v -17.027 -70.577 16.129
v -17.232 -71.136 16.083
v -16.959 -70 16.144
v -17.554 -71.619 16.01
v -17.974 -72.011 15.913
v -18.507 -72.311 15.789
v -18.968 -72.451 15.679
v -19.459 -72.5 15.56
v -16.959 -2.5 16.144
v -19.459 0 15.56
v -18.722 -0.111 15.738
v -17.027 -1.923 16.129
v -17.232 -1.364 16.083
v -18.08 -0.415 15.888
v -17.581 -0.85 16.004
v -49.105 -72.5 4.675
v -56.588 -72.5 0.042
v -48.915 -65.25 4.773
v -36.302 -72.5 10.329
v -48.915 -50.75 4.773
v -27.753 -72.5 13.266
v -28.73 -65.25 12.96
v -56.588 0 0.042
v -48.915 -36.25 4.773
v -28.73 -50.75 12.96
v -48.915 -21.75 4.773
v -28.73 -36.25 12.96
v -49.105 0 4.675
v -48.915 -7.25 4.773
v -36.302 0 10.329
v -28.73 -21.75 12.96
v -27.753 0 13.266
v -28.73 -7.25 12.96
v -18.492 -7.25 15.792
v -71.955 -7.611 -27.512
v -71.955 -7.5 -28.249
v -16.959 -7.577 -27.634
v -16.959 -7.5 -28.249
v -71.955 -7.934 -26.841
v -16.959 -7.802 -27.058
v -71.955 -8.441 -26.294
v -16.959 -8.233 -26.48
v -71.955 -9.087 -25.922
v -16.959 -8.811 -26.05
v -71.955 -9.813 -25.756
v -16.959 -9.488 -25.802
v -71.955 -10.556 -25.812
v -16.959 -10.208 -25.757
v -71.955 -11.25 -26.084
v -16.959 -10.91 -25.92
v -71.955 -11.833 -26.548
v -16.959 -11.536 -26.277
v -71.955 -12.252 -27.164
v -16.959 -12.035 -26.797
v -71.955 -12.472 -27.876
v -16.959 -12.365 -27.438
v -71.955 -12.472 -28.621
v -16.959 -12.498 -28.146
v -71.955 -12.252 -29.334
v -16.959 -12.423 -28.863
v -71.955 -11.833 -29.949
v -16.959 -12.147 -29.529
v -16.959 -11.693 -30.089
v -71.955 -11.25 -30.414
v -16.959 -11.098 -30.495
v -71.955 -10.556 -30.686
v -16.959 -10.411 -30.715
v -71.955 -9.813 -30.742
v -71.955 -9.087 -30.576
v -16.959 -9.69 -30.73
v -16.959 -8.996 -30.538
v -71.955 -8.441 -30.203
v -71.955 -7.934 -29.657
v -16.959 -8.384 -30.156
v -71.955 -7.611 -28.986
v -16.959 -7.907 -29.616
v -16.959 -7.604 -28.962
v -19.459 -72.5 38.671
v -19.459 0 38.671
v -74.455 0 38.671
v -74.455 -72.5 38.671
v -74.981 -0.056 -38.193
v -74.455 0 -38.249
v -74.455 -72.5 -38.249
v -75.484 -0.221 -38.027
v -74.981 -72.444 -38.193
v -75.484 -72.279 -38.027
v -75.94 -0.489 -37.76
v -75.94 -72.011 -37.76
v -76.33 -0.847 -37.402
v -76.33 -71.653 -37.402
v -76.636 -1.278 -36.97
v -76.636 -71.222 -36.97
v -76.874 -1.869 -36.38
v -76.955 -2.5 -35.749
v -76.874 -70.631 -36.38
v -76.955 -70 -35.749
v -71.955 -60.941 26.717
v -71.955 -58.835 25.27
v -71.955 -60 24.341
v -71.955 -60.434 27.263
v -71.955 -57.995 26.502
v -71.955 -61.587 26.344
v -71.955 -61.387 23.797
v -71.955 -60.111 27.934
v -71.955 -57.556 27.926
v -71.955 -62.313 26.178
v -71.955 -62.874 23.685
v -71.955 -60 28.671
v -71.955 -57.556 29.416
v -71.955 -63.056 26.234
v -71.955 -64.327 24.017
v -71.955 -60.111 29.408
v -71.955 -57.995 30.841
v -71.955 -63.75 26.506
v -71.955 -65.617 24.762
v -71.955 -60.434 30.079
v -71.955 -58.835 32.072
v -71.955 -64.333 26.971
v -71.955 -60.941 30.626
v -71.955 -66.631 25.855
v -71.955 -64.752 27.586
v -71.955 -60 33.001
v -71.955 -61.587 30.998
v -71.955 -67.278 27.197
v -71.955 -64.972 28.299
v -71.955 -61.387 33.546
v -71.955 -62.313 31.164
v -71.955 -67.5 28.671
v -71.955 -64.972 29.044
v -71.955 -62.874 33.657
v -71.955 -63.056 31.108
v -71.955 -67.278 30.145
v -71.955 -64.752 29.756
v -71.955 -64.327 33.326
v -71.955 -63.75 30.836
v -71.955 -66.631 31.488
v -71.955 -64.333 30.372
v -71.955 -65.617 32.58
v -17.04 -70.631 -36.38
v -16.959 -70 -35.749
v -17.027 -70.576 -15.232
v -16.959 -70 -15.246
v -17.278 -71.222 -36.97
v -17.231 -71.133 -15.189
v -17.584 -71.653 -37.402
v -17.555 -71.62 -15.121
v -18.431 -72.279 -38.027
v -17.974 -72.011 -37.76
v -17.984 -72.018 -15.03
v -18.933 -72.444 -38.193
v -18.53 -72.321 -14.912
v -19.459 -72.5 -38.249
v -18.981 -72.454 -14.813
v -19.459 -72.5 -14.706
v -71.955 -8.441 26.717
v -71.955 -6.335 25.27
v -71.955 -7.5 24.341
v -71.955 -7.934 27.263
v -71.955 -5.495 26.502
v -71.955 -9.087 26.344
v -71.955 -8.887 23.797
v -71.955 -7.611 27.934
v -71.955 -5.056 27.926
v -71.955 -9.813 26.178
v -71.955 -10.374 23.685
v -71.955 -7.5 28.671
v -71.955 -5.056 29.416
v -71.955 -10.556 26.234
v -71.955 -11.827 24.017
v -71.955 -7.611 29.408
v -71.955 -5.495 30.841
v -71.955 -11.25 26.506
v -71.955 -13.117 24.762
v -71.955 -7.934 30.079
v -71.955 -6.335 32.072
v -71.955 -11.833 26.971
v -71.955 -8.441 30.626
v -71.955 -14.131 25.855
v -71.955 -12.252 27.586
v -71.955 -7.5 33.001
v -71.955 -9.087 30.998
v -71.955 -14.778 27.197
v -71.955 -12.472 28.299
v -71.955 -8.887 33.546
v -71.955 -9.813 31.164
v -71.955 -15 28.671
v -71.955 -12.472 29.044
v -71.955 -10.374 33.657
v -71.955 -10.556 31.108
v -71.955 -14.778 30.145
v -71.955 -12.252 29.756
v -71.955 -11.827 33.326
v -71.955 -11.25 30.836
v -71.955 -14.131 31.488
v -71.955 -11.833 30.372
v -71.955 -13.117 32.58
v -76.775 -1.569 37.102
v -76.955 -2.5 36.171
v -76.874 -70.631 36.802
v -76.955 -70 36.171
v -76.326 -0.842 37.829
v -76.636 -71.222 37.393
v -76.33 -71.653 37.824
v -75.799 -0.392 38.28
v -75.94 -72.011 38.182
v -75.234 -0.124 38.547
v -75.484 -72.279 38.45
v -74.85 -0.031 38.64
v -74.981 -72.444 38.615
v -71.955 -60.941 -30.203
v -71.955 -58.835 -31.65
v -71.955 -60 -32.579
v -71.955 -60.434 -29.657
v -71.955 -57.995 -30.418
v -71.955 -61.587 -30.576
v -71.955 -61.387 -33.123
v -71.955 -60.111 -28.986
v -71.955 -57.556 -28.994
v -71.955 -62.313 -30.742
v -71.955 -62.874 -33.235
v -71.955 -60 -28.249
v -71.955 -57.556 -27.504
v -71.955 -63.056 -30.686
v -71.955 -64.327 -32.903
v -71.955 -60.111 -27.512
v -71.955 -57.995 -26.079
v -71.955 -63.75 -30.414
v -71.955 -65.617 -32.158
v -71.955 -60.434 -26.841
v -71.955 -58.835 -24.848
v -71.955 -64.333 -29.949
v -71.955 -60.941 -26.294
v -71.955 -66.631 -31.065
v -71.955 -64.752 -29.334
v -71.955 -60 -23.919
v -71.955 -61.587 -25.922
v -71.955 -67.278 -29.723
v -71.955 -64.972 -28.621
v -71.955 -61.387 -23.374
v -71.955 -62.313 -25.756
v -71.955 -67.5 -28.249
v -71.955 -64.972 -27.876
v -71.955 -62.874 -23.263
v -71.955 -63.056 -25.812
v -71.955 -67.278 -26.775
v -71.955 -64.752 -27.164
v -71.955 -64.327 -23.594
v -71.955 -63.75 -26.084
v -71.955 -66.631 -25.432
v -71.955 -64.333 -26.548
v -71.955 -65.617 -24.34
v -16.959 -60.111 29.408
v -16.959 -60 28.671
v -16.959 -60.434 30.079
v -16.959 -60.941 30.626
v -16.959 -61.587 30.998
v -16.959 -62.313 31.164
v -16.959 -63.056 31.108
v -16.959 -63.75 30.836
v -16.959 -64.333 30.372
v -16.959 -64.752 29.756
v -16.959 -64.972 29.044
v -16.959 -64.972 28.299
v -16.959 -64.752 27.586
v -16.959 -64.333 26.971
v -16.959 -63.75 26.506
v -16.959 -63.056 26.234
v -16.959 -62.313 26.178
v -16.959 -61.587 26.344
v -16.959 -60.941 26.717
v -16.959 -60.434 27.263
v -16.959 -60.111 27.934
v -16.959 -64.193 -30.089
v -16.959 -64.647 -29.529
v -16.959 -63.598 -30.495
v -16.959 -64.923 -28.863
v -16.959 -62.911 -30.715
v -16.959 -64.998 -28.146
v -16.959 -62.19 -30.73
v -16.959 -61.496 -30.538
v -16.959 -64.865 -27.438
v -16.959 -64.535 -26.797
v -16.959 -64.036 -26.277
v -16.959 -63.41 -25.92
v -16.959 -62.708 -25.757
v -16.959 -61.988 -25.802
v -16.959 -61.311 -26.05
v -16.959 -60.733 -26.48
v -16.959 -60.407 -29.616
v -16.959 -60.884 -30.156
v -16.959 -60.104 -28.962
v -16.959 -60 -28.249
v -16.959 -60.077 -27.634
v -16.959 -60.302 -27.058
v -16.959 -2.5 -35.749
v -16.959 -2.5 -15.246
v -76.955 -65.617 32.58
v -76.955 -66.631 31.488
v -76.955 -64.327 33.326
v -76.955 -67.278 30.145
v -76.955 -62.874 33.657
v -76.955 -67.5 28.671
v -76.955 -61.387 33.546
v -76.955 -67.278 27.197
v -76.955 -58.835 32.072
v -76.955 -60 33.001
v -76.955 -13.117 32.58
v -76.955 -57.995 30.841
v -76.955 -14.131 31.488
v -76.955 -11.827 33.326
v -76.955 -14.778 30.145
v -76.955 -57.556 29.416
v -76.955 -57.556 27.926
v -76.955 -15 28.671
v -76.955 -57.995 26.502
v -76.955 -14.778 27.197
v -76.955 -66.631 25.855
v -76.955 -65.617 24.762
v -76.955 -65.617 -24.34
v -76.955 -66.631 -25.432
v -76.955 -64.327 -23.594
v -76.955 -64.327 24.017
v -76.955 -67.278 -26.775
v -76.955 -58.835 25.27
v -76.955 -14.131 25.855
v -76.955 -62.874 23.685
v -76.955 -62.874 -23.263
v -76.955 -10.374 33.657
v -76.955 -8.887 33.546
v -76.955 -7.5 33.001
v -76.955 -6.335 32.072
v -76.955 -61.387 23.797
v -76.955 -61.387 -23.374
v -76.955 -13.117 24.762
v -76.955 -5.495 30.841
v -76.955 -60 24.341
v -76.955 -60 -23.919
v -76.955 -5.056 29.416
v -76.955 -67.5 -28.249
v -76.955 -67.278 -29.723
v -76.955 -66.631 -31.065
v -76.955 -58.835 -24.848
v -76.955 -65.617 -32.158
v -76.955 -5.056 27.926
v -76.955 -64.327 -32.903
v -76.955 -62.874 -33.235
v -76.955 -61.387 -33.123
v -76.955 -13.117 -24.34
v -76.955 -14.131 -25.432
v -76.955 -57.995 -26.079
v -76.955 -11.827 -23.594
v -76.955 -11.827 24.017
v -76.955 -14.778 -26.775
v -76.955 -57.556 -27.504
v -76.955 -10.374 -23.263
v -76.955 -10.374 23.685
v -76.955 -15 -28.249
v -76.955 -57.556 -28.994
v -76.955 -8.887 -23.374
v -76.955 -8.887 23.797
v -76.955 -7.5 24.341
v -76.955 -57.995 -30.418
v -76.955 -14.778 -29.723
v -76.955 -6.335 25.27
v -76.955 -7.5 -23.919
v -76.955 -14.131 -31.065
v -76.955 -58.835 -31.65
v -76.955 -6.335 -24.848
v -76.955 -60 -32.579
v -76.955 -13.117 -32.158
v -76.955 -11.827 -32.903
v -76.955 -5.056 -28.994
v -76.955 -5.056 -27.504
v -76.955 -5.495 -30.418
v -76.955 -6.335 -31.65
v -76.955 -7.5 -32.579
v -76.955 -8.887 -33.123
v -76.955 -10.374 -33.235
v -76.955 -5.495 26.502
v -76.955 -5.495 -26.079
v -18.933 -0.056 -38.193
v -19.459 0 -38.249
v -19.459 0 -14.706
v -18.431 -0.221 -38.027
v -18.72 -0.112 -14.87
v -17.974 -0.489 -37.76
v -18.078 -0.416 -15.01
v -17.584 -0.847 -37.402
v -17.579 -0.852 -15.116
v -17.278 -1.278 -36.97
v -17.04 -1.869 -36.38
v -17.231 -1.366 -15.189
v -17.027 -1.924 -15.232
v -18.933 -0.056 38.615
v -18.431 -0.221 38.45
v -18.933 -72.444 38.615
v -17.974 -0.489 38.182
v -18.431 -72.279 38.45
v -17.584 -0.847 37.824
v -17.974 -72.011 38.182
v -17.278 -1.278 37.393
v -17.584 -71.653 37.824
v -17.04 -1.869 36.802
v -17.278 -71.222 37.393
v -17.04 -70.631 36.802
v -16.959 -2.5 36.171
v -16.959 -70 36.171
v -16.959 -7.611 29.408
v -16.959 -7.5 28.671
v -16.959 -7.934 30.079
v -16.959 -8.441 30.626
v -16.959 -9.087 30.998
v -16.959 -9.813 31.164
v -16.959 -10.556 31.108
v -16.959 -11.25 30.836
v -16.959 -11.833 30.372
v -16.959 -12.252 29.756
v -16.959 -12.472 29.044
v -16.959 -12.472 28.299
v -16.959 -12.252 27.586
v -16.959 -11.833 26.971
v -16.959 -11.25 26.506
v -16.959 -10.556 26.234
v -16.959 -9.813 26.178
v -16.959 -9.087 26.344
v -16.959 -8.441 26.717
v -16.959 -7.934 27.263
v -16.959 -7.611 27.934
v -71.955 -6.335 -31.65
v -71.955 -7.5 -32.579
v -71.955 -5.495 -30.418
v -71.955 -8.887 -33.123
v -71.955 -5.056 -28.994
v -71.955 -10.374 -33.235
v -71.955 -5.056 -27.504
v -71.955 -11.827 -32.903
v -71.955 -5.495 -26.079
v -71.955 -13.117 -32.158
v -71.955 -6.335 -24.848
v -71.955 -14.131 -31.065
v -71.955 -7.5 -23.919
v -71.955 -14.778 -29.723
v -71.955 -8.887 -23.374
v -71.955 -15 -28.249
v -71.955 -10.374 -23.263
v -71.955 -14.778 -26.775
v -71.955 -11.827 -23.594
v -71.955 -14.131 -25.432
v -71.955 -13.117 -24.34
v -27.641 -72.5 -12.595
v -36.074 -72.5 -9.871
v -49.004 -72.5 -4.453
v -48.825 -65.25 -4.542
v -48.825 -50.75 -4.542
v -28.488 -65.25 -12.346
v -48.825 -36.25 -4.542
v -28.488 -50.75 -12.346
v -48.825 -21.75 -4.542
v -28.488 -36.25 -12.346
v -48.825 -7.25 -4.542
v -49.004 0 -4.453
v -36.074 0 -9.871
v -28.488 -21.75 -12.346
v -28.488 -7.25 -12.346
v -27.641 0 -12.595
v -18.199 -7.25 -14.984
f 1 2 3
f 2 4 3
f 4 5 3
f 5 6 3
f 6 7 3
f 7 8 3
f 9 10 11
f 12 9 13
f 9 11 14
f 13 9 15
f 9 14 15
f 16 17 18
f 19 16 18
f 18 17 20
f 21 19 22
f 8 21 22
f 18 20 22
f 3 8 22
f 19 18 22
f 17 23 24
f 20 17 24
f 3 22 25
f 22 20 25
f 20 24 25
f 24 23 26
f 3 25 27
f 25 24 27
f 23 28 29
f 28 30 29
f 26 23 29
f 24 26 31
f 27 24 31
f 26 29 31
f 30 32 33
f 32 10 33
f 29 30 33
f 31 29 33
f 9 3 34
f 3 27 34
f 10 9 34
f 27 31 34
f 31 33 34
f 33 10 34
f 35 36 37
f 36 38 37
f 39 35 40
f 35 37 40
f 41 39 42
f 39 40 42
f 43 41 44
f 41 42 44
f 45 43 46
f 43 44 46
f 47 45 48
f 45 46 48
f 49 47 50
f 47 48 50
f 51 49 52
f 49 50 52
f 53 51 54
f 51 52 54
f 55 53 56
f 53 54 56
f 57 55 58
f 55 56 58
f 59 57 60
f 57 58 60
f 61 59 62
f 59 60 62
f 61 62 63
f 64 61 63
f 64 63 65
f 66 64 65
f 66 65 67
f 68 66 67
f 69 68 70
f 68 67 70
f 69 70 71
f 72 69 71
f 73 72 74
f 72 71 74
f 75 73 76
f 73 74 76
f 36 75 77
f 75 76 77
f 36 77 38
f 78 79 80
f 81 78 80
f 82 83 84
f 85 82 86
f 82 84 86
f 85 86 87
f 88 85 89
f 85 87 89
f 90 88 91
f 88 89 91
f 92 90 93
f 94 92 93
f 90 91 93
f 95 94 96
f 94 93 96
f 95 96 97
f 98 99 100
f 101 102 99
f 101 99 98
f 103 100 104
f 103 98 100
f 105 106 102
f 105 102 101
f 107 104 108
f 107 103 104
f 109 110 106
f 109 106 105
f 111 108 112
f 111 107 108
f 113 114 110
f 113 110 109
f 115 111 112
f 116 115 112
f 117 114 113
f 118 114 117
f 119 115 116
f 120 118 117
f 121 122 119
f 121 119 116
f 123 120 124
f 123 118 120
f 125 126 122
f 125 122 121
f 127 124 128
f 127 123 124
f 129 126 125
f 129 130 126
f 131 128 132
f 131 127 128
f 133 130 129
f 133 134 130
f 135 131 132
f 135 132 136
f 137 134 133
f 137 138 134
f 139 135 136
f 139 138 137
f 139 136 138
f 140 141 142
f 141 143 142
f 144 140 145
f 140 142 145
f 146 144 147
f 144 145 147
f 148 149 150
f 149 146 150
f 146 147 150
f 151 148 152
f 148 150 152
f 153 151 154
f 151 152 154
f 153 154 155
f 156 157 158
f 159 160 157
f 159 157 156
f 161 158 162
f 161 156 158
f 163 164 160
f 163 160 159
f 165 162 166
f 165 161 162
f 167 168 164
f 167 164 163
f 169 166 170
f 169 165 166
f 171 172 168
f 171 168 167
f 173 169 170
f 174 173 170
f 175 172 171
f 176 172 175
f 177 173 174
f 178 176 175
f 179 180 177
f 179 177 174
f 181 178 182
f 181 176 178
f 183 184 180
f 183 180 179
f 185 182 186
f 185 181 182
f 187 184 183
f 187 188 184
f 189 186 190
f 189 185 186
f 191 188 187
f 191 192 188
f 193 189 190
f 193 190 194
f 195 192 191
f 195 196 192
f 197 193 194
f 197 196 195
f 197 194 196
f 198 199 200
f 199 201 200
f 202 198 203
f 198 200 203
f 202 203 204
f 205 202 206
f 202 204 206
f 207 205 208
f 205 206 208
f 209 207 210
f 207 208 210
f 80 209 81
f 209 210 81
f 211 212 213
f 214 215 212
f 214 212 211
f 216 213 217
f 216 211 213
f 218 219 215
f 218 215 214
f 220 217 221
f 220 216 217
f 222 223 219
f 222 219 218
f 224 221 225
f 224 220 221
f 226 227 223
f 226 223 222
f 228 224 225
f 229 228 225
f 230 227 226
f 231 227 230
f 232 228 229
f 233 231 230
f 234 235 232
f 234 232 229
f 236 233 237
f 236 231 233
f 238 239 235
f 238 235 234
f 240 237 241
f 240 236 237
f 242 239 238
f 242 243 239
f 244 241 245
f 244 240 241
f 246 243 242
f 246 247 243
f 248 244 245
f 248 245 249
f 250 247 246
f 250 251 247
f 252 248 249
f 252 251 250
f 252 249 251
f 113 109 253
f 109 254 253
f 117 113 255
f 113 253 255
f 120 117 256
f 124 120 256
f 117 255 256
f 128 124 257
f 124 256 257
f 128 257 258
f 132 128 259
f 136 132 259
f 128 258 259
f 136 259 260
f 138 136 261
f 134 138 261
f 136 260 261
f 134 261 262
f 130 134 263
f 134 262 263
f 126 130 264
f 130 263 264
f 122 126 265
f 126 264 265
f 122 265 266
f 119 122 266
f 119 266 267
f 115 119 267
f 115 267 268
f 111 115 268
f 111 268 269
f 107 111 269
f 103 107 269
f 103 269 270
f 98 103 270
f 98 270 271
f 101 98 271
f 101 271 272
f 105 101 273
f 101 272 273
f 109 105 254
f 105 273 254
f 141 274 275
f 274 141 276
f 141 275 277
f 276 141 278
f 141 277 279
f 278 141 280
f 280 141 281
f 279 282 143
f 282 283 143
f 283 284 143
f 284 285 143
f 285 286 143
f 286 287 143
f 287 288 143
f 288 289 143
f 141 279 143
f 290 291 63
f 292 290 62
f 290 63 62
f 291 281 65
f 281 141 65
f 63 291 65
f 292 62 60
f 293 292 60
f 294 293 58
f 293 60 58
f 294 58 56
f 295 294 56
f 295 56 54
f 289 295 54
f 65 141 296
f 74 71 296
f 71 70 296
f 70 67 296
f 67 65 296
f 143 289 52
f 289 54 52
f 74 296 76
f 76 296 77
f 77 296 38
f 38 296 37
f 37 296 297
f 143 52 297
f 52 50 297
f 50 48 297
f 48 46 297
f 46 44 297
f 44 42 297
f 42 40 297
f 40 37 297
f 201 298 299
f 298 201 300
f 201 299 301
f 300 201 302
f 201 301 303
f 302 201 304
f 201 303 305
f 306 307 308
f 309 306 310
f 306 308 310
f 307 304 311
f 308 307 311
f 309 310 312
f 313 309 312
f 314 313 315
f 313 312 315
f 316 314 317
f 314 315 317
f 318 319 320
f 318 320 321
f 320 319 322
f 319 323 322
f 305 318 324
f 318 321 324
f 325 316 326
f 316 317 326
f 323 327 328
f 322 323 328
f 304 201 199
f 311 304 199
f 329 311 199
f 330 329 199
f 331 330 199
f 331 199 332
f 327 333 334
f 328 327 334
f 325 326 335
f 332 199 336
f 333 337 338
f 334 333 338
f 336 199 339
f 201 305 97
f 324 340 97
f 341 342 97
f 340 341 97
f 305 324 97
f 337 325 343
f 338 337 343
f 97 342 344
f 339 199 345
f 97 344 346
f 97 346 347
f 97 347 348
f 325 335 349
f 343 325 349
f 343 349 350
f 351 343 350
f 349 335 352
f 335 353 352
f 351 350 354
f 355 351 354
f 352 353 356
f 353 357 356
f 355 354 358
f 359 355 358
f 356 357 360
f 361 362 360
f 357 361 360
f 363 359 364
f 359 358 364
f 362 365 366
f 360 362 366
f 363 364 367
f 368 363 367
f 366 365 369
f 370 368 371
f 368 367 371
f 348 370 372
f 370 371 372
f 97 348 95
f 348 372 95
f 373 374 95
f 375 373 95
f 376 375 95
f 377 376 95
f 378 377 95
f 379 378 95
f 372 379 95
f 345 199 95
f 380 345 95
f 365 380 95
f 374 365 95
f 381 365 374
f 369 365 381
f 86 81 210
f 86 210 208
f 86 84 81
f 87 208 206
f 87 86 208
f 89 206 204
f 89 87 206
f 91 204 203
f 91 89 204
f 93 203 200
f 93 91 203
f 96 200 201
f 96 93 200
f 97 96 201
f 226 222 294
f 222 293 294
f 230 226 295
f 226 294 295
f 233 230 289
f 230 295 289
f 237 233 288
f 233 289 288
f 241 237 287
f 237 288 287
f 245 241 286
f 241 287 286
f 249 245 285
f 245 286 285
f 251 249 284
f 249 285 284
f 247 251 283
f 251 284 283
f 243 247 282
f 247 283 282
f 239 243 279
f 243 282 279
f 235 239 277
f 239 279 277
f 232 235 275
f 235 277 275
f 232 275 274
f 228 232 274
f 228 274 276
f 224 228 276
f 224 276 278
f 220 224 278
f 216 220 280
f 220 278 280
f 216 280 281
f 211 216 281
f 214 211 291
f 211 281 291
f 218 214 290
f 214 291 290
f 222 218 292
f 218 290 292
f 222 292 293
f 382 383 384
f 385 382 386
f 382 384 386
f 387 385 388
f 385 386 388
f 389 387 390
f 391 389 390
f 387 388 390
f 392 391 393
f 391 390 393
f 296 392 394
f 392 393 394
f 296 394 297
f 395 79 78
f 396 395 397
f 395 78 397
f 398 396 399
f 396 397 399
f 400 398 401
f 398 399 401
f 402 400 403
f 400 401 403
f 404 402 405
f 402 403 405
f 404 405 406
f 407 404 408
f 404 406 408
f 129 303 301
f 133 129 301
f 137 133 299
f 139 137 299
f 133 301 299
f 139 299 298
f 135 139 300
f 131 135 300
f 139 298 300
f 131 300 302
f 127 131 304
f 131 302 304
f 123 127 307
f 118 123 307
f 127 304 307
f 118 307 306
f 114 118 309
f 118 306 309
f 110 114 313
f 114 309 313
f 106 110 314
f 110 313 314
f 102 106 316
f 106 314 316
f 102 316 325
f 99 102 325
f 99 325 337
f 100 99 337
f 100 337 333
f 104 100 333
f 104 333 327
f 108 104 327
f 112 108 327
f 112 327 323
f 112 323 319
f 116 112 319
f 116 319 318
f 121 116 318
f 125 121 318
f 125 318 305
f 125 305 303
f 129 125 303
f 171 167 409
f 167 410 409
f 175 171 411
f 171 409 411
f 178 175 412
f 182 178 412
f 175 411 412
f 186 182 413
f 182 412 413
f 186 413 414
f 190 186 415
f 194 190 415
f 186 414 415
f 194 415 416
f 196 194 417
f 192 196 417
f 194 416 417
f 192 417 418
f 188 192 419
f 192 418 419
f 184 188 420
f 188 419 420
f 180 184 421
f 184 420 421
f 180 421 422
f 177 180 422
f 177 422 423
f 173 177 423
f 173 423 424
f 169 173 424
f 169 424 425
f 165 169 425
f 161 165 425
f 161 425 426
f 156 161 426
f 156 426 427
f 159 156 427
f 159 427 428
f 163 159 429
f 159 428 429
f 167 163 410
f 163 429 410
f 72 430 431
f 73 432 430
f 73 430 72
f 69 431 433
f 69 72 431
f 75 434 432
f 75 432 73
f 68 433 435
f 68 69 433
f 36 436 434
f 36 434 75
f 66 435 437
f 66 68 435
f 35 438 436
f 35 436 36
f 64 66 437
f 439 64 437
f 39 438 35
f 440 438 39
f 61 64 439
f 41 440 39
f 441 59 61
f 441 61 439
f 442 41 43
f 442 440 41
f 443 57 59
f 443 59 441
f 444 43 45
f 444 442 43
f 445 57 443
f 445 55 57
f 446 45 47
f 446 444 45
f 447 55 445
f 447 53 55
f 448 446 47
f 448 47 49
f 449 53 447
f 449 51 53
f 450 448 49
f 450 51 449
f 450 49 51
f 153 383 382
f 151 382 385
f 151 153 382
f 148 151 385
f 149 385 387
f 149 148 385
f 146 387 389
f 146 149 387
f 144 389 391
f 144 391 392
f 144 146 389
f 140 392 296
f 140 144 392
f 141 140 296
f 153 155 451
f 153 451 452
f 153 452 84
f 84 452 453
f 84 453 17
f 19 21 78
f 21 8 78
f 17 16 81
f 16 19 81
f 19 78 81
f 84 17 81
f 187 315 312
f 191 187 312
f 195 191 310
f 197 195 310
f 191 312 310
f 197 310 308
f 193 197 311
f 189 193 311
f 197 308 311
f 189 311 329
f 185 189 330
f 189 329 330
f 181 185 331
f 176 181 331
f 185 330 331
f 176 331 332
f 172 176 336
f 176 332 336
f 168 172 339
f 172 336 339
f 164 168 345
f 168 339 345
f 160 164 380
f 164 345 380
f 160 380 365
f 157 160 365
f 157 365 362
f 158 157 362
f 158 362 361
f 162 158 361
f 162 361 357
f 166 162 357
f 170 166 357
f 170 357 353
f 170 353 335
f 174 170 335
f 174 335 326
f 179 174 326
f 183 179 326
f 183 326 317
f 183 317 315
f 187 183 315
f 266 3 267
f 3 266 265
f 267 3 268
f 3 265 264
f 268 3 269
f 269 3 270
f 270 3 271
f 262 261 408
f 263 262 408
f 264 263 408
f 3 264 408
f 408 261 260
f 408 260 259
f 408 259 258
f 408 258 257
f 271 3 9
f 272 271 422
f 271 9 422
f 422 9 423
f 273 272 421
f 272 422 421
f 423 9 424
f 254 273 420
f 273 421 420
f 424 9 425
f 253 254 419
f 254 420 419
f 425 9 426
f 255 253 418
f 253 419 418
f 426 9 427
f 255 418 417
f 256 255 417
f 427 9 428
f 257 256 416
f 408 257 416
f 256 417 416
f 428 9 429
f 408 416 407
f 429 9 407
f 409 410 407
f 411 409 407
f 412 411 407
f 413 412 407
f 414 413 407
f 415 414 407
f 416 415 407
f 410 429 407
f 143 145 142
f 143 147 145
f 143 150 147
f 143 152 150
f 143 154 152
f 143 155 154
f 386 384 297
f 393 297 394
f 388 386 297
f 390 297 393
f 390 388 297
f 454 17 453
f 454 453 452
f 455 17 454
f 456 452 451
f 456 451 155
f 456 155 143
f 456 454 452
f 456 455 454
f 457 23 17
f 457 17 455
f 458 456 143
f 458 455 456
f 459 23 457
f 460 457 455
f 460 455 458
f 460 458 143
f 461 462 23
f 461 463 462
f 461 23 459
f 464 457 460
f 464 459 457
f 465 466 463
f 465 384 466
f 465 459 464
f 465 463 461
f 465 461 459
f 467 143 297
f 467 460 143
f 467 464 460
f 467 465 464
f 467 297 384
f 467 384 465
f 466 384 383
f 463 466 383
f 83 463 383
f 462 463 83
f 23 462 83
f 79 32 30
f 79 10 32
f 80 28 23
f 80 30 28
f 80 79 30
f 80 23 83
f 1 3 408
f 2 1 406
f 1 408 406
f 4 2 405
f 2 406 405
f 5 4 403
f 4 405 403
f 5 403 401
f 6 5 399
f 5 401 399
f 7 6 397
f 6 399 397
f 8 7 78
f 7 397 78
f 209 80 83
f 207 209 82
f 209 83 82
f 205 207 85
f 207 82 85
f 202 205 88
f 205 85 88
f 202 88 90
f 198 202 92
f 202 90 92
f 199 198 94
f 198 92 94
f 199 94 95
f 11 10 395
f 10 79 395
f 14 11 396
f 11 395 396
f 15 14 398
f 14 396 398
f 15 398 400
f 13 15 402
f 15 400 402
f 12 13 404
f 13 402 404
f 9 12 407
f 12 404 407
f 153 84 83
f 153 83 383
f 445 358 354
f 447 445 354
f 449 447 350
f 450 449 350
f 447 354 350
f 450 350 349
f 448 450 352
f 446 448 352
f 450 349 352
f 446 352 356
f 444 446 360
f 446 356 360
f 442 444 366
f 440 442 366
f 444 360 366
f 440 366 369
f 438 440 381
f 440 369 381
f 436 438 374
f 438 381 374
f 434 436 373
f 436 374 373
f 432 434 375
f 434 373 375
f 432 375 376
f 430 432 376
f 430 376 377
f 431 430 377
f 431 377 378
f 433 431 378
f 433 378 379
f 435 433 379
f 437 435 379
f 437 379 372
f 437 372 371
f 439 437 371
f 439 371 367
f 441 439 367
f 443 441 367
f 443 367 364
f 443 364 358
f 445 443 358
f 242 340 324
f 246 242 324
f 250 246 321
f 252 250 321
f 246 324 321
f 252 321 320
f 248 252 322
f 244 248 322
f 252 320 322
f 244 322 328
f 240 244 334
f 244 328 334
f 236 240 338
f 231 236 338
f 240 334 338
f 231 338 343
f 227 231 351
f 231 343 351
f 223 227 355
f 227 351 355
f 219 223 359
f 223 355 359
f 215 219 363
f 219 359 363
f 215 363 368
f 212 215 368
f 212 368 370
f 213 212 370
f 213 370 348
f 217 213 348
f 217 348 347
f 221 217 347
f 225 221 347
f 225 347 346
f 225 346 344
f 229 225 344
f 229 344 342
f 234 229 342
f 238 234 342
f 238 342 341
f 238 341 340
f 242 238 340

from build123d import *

# Parameters (mm, degrees)
F1_DEPTH       = 72.5
F3_D           = 5
F3_CBORE_D     = 10
F3_CBORE_DEPTH = 5
F4_R           = 2.5
F5_R           = 2.5


# Not quite as in the source:
# - ends of sketch curves that miss each other by under 0.0002 mm in the source are joined
# - the dataset's text gives a spline's control points without its knots; the knots are read off the source's solid


with BuildPart() as f1:
    # F0 (on Front) → F1 (new body)
    with BuildSketch(Plane.XZ):
        with BuildLine():
            add(Edge.make_bspline(
                [(-56.5881601574, 0.0419234738), (-55.5197950815, -0.7442946781), (-53.1301338185, -2.2933127374), (-48.9084685045, -4.5561843947), (-44.1859500973, -6.7339324001), (-39.1068883918, -8.7916644331), (-33.8193544964, -10.6897211609), (-29.3644227389, -12.1035605133), (-25.8455914341, -13.1126993817), (-22.383504382, -14.0327971877), (-19.4313477815, -14.7259719893), (-17.3706943762, -15.160741157), (-16.9593766332, -15.2455717325)],
                knots=[0, 0, 0, 0, 0.03125, 0.0625, 0.09375, 0.125, 0.15625, 0.1875, 0.203125, 0.21875, 0.25, 0.2578399244, 0.2578399244, 0.2578399244, 0.2578399244], degree=3))
            add(Edge.make_bspline(
                [(-56.5881601574, 0.0419234738), (-55.5355017666, 0.8486239051), (-53.1764131036, 2.443347048), (-48.9992069483, 4.7861572474), (-44.3187202519, 7.053077305), (-39.2793074327, 9.2063486815), (-34.0283660726, 11.2037109249), (-29.6007919855, 12.7012369201), (-26.1016179695, 13.7765699234), (-22.65755408, 14.761891198), (-19.6168305087, 15.5368665147), (-17.4672919643, 16.0305431026), (-16.9593493648, 16.1441983995)],
                knots=[1.43705e-05, 1.43705e-05, 1.43705e-05, 1.43705e-05, 0.03125, 0.0625, 0.09375, 0.125, 0.15625, 0.1875, 0.203125, 0.21875, 0.25, 0.2597438328, 0.2597438328, 0.2597438328, 0.2597438328], degree=3))
            Line((-16.9593493648, 16.1441983995), (-16.9593493648, 38.671177907))
            Line((-16.9593493648, 38.671177907), (-76.9551545382, 38.671177907))
            Line((-76.9551545382, 38.671177907), (-76.9551545382, -38.248822093))
            Line((-76.9551545382, -38.248822093), (-16.9593493648, -38.248822093))
            Line((-16.9593493648, -38.248822093), (-16.9593766332, -15.2455717325))
        make_face()
    extrude(amount=F1_DEPTH)

    # F3 (through all)
    with Locations(Plane(origin=(-76.9551545382, 0, 0), x_dir=(0, -1, 0), z_dir=(-1, 0, 0))):
        with Locations((10, 28.671177907), (62.5, 28.671177907), (62.5, -28.248822093), (10, -28.248822093)):
            CounterBoreHole(F3_D / 2, F3_CBORE_D / 2, F3_CBORE_DEPTH)

    # F4
    f4_edges = [f1.edges().sort_by_distance(p)[0] for p in [
        (-76.955155, -72.5, 0.211178),
        (-76.955155, -36.25, 38.671178),
        (-76.955155, 0, 0.211178),
        (-76.955155, -36.25, -38.248822),
    ]]
    fillet(f4_edges, radius=F4_R)

    # F5
    f5_edges = [f1.edges().sort_by_distance(p)[0] for p in [
        (-16.959349, -36.25, 38.671178),
        (-16.959349, -72.5, 27.407688),
        (-16.959349, 0, 27.407688),
        (-16.959363, 0, -26.747197),
        (-16.959349, -36.25, -38.248822),
        (-16.959363, -72.5, -26.747197),
    ]]
    fillet(f5_edges, radius=F5_R)


solid = f1.part
